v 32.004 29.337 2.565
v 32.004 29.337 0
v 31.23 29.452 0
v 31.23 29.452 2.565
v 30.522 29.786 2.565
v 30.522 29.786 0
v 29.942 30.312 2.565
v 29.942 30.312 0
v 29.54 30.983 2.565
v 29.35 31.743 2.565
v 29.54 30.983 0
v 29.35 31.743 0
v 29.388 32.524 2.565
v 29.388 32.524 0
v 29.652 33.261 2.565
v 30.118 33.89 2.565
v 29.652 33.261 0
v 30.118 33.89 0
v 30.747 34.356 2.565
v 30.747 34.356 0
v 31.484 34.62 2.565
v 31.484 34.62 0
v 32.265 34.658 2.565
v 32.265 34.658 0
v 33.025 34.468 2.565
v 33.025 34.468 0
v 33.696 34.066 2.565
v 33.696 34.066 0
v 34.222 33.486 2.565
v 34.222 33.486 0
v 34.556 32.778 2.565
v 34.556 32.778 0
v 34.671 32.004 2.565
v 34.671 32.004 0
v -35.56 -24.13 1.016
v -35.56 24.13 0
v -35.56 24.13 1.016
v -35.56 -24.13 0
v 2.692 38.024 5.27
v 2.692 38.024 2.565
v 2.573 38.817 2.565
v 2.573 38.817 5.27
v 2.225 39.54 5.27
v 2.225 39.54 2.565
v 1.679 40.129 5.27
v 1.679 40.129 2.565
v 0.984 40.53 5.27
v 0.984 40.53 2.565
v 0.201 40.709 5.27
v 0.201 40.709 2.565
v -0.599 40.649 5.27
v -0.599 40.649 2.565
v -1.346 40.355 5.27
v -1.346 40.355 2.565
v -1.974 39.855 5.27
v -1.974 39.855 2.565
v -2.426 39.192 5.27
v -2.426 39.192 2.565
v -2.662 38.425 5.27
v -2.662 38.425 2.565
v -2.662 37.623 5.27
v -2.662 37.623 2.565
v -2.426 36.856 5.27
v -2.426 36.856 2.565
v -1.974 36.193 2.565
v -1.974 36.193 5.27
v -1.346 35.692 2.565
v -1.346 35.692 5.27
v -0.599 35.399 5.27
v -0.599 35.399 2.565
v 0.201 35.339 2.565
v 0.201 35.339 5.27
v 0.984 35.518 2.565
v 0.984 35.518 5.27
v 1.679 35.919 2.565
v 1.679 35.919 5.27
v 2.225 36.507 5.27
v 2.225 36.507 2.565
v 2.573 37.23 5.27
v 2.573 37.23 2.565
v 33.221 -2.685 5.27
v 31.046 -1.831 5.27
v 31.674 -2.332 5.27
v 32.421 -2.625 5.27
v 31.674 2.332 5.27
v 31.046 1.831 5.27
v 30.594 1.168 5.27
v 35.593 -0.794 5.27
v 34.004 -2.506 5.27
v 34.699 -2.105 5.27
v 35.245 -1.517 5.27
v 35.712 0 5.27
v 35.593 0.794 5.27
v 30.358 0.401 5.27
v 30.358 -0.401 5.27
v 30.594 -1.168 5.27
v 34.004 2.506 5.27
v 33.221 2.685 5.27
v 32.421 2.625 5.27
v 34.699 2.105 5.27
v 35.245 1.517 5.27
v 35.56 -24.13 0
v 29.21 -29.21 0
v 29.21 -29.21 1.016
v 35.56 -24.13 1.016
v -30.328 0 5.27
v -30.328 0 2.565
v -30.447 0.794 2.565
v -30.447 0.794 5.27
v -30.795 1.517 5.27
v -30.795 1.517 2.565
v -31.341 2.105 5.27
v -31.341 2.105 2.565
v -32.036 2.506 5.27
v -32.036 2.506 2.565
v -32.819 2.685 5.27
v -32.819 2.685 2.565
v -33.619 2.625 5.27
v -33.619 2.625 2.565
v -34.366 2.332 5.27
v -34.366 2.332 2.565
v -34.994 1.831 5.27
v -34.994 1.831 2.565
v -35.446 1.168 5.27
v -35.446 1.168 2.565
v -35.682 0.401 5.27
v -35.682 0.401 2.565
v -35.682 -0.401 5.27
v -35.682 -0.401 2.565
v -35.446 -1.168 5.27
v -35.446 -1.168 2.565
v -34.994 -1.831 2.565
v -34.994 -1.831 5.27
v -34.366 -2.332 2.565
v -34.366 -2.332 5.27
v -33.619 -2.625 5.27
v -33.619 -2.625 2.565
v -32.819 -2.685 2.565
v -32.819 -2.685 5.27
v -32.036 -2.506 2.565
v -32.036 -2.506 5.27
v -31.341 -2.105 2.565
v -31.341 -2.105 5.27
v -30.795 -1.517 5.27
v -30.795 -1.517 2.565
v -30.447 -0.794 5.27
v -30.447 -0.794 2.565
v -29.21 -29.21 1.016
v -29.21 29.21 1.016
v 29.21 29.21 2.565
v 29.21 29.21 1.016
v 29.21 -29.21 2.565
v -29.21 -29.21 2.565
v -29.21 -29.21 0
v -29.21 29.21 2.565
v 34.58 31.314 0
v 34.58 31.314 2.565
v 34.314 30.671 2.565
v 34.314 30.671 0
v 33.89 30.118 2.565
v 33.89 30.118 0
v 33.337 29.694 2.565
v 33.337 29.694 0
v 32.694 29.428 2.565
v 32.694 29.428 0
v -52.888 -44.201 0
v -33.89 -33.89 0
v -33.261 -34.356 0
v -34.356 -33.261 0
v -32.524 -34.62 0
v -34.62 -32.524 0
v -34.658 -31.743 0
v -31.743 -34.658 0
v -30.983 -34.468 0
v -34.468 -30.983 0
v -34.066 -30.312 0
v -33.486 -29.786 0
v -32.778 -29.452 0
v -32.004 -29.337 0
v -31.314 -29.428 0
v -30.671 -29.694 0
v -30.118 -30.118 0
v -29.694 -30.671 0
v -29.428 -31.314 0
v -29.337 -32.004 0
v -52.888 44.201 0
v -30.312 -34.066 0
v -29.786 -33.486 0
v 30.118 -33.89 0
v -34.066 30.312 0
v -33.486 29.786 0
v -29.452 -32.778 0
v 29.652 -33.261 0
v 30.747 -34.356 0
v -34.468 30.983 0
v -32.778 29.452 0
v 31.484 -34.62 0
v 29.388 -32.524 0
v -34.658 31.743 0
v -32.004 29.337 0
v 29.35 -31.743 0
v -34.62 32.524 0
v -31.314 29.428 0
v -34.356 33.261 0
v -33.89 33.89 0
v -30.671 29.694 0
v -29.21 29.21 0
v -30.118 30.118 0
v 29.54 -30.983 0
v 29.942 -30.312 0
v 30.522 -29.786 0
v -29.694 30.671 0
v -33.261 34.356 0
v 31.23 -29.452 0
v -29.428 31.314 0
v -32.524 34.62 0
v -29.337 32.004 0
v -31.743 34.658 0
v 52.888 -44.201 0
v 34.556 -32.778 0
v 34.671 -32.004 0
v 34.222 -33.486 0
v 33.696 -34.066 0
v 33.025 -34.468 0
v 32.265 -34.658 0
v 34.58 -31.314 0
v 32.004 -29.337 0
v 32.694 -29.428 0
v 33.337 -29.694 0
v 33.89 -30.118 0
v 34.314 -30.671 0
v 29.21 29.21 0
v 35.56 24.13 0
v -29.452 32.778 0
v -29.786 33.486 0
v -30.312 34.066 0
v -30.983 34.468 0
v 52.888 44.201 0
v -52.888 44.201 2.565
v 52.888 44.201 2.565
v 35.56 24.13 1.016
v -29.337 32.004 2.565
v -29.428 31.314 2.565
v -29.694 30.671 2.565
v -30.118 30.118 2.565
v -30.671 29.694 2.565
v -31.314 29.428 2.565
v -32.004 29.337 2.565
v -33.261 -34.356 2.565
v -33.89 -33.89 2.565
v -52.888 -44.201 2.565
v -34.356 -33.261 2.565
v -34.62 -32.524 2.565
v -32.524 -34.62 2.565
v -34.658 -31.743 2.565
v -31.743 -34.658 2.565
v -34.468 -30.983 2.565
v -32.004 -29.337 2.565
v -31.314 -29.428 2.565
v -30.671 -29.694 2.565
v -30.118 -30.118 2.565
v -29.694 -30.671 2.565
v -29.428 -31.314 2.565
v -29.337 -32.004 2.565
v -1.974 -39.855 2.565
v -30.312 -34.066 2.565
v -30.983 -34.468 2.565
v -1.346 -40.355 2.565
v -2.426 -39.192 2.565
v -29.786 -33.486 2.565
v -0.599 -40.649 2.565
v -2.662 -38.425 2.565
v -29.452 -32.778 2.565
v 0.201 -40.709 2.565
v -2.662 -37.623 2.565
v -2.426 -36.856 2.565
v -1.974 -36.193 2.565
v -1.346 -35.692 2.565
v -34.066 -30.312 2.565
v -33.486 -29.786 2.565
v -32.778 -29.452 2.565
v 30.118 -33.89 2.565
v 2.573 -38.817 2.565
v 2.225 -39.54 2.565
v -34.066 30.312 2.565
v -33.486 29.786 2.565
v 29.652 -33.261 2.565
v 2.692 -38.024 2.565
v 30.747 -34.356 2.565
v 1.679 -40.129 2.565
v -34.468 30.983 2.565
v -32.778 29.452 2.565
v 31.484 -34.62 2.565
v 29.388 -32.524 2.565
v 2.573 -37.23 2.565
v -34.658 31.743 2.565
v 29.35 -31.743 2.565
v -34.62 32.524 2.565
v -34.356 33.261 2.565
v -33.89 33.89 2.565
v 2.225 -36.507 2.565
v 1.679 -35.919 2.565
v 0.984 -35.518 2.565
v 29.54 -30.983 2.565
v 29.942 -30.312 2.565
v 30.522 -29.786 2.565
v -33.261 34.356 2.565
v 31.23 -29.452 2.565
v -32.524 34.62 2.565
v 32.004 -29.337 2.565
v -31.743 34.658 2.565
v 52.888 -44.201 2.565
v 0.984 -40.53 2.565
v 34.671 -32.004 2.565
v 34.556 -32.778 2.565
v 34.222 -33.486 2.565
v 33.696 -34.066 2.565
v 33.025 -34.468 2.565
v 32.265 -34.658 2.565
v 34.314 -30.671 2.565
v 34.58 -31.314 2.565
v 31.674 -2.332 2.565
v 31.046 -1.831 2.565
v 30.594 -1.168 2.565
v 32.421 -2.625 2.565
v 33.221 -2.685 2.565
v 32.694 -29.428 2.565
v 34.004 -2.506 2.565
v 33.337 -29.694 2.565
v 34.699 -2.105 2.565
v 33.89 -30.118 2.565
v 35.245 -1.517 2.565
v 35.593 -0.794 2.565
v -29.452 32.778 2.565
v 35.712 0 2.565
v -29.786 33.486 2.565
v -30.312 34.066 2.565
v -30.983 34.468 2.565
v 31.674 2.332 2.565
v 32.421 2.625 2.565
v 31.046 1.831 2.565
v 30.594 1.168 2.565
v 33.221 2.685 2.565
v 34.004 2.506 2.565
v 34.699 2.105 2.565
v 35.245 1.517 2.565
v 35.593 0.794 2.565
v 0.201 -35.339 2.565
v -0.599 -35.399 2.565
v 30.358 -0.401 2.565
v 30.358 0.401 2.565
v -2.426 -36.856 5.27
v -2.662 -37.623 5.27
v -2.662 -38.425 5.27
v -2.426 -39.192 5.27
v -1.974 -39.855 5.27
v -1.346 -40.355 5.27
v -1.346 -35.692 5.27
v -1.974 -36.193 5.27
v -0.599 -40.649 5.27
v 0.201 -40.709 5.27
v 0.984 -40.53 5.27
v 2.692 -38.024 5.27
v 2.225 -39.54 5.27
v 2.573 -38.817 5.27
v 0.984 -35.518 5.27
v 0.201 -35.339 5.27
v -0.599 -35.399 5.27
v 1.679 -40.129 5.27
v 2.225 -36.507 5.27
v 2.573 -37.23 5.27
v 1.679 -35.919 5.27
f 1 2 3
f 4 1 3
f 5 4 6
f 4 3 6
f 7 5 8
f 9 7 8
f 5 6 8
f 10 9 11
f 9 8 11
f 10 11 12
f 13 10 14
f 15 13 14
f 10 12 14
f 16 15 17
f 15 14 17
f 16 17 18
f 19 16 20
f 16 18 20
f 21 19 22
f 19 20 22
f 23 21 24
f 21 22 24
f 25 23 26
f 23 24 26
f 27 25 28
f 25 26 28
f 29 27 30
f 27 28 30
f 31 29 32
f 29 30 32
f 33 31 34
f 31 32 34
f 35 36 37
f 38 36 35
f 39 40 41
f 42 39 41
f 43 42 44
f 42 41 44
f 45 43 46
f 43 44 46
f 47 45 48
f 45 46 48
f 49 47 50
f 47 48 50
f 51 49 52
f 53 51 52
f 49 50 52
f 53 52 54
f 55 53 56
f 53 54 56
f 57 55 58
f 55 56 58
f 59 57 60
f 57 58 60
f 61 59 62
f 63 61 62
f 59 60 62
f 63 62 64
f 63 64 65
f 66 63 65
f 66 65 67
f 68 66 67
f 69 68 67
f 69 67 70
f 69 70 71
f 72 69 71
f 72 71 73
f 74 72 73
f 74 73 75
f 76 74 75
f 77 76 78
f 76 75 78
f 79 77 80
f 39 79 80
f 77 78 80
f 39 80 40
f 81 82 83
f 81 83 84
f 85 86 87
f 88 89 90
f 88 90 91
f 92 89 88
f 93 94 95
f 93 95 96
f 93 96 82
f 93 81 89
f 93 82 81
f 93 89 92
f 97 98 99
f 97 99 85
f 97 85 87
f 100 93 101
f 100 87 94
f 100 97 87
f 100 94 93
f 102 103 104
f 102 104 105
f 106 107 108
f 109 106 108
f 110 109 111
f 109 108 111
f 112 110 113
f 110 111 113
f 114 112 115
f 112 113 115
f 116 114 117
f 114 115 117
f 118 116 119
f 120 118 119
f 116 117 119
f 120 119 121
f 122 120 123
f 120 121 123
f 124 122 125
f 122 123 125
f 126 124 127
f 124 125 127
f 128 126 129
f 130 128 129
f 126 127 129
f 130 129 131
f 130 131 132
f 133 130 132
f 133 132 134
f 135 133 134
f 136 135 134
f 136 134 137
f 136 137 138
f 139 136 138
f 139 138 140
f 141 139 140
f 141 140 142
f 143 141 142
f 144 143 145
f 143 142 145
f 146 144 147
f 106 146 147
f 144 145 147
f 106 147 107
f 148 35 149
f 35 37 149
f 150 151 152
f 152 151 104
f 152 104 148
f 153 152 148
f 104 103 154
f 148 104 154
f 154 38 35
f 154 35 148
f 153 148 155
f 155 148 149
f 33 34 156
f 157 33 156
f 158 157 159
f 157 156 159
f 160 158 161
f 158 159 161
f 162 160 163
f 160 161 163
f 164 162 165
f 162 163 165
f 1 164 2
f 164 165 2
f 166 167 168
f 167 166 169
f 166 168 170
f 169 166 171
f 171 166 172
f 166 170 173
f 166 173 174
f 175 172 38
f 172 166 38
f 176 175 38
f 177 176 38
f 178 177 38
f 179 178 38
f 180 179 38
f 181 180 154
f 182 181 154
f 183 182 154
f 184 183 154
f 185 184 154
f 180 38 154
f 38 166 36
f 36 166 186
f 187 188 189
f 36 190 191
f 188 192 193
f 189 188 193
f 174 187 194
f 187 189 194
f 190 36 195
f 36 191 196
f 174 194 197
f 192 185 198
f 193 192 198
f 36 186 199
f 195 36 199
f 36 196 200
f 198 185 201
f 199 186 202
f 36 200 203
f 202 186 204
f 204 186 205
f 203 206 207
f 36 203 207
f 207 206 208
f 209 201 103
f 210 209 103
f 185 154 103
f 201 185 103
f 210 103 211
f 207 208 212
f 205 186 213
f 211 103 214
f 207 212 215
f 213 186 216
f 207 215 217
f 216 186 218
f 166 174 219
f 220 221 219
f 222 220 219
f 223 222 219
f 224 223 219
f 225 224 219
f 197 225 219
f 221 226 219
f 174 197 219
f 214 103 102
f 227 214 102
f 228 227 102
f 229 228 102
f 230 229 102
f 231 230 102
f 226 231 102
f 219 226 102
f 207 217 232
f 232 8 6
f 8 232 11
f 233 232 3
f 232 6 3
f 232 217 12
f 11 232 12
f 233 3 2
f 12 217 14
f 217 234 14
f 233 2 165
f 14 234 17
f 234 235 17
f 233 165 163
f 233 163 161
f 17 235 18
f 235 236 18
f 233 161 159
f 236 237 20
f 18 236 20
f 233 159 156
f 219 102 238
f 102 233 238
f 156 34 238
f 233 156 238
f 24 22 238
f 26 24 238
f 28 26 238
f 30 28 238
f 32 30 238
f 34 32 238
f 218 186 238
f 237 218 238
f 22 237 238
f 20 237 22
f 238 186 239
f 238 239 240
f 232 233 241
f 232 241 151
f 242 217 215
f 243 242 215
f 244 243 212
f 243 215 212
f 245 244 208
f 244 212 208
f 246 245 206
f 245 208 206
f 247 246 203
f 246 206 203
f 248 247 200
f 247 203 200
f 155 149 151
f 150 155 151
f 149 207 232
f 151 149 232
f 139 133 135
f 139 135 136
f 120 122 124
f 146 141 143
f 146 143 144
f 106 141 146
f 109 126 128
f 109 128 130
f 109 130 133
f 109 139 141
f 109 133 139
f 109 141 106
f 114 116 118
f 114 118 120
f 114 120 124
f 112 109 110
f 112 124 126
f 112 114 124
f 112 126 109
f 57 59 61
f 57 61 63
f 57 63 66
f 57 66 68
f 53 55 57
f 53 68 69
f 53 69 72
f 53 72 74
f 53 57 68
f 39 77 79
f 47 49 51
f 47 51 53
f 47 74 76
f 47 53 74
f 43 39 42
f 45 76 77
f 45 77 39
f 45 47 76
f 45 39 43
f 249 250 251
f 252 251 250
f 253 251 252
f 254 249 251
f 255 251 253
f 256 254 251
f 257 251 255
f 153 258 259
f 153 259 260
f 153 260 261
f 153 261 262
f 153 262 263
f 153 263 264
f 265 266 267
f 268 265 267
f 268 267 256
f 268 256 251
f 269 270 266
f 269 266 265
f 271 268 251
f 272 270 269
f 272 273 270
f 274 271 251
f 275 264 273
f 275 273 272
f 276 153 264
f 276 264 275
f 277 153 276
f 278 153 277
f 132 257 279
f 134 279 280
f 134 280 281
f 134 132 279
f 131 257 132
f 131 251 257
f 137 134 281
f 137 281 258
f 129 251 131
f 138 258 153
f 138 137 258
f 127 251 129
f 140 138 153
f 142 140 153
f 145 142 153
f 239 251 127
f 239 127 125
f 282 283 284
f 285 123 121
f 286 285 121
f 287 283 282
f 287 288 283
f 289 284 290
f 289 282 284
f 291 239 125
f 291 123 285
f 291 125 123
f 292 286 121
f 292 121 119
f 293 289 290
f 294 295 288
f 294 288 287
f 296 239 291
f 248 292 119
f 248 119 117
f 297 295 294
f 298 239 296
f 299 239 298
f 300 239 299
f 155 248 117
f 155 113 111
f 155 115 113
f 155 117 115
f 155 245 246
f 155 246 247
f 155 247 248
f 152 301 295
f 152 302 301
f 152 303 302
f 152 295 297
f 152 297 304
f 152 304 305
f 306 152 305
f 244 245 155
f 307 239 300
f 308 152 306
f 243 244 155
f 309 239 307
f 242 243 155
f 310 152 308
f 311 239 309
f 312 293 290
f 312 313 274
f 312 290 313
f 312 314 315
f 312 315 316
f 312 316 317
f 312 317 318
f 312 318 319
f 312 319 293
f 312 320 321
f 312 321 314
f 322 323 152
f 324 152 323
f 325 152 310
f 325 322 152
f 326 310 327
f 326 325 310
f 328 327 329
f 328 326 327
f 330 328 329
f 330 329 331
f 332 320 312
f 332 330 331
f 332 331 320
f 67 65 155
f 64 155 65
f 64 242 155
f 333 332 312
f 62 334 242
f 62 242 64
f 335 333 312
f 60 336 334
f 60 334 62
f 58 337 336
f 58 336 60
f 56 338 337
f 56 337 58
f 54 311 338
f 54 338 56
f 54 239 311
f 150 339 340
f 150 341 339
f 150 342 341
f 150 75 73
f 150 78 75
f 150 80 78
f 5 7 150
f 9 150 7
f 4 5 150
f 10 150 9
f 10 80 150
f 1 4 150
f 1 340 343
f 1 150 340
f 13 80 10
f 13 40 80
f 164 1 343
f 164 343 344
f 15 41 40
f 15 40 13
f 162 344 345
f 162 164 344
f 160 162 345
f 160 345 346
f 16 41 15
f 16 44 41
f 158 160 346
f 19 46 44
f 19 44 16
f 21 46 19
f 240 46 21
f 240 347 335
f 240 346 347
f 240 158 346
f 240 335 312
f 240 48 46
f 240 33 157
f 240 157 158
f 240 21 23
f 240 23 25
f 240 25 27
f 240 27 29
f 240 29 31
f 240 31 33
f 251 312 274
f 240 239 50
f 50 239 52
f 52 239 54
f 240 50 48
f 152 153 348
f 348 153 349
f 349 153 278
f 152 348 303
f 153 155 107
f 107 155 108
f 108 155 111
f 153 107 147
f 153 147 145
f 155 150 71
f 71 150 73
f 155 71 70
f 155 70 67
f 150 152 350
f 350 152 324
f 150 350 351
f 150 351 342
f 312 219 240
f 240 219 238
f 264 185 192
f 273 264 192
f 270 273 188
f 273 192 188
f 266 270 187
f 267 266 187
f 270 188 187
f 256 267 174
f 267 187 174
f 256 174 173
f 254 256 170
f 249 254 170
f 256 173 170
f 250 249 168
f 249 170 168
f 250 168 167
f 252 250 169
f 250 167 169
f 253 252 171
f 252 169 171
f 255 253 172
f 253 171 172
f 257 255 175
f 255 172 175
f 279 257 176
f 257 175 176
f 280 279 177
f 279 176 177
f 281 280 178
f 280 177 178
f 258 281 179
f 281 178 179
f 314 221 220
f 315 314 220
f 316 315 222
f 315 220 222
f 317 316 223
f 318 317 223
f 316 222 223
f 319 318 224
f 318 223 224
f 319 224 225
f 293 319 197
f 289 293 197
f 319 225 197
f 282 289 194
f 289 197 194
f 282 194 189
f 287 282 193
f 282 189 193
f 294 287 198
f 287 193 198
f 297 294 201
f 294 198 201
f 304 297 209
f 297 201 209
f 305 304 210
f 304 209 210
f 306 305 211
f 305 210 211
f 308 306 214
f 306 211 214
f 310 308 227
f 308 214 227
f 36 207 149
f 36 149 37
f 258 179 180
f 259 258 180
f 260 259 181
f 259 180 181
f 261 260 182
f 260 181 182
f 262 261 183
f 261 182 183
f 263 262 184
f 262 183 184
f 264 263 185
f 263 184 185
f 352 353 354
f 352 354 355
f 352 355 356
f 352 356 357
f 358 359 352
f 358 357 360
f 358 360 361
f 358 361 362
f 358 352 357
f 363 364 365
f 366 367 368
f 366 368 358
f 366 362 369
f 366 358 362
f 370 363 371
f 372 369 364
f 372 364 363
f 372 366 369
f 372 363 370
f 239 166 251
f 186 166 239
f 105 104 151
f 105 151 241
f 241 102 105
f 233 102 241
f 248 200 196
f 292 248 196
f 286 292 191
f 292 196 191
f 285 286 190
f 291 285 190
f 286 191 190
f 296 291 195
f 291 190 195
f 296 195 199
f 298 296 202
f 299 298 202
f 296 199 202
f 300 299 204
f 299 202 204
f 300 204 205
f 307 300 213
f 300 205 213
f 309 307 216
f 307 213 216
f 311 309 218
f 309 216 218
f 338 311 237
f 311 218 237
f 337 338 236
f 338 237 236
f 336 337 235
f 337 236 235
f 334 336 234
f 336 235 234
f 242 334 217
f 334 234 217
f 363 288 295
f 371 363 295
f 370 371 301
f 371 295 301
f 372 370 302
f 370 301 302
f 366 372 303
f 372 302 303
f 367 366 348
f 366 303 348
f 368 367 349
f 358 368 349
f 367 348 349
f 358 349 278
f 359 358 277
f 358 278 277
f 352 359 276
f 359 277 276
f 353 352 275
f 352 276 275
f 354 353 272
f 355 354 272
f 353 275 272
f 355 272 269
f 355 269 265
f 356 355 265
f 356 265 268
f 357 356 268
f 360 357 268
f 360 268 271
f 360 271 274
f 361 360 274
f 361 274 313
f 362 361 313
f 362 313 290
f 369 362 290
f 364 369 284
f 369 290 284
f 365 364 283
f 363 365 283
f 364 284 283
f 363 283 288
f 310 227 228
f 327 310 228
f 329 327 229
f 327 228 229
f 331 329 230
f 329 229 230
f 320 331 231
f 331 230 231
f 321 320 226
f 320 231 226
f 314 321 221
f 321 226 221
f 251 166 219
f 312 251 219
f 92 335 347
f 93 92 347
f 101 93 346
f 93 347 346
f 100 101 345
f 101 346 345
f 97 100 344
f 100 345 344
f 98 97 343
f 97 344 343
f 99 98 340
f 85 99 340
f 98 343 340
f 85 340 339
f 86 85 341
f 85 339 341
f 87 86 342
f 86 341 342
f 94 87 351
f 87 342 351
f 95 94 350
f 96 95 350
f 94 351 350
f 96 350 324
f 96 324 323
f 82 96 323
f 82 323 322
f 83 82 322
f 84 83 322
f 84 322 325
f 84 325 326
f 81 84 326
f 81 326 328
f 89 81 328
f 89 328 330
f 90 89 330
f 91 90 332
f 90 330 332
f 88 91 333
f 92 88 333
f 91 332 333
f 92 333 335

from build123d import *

# Parameters (mm, degrees)
F0_W     = 105.7758629322
F0_H     = 88.4018465877
F0_R     = 2.6924
F1_DEPTH = 2.5654
F2_DEPTH = 1.016
F3_R     = 2.6924
F4_DEPTH = 2.7051


with BuildPart() as f1:
    # F0 (on Top) → F1 (new body)
    with BuildSketch(Plane.XY):
        Rectangle(F0_W, F0_H)
        with BuildLine():
            ThreePointArc((-32.004, -29.337), (-30.1181462146, -30.1181462146), (-29.337, -32.004))
            ThreePointArc((-29.337, -32.004), (-33.8898537854, -33.8898537854), (-32.004, -29.337))
        make_face(mode=Mode.SUBTRACT)
        with Locations((0, -38.0238)):
            Circle(F0_R, mode=Mode.SUBTRACT)
        with BuildLine():
            ThreePointArc((32.004, -29.337), (33.8898537854, -30.1181462146), (34.671, -32.004))
            ThreePointArc((34.671, -32.004), (30.1181462146, -33.8898537854), (32.004, -29.337))
        make_face(mode=Mode.SUBTRACT)
        with BuildLine():
            ThreePointArc((-32.004, 29.337), (-33.8898537854, 33.8898537854), (-29.337, 32.004))
            ThreePointArc((-29.337, 32.004), (-30.1181462146, 30.1181462146), (-32.004, 29.337))
        make_face(mode=Mode.SUBTRACT)
        with BuildLine():
            Line((35.56, -24.13), (29.21, -29.21))
            Line((29.21, -29.21), (-29.21, -29.21))
            Line((-29.21, -29.21), (-35.56, -24.13))
            Line((-35.56, -24.13), (-35.56, -0.8929825082))
            ThreePointArc((-35.56, -0.8929825082), (-35.7124, 0), (-35.56, 0.8929825082))
            Line((-35.56, 0.8929825082), (-35.56, 24.13))
            Line((-35.56, 24.13), (-29.21, 29.21))
            Line((-29.21, 29.21), (0, 29.21))
            Line((0, 29.21), (29.21, 29.21))
            Line((29.21, 29.21), (35.56, 24.13))
            Line((35.56, 24.13), (35.56, 0.8929825082))
            ThreePointArc((35.56, 0.8929825082), (35.6740265409, 0.4529468843), (35.7124, 0))
            ThreePointArc((35.7124, 0), (35.6740265409, -0.4529468843), (35.56, -0.8929825082))
            Line((35.56, -0.8929825082), (35.56, -24.13))
        make_face(mode=Mode.SUBTRACT)
        with BuildLine():
            ThreePointArc((2.6924, 38.0238), (1.9038142977, 36.1199857023), (0, 35.3314))
            ThreePointArc((0, 35.3314), (-1.9038142977, 39.9276142977), (2.6924, 38.0238))
        make_face(mode=Mode.SUBTRACT)
        with BuildLine():
            ThreePointArc((32.004, 29.337), (30.1181462146, 33.8898537854), (34.671, 32.004))
            ThreePointArc((34.671, 32.004), (33.8898537854, 30.1181462146), (32.004, 29.337))
        make_face(mode=Mode.SUBTRACT)
        with BuildLine():
            Line((-35.56, -24.13), (-29.21, -29.21))
            Line((-29.21, -29.21), (-29.21, 29.21))
            Line((-29.21, 29.21), (-35.56, 24.13))
            Line((-35.56, 24.13), (-35.56, 0.8929825082))
            ThreePointArc((-35.56, 0.8929825082), (-32.5670531157, 2.6540265409), (-30.3276, 0))
            ThreePointArc((-30.3276, 0), (-32.5670531157, -2.6540265409), (-35.56, -0.8929825082))
            Line((-35.56, -0.8929825082), (-35.56, -24.13))
        make_face()
        with BuildLine():
            Line((29.21, 29.21), (29.21, -29.21))
            Line((29.21, -29.21), (35.56, -24.13))
            Line((35.56, -24.13), (35.56, -0.8929825082))
            ThreePointArc((35.56, -0.8929825082), (30.3276, 0), (35.56, 0.8929825082))
            Line((35.56, 0.8929825082), (35.56, 24.13))
            Line((35.56, 24.13), (29.21, 29.21))
        make_face()
        with BuildLine():
            ThreePointArc((2.6924, 38.0238), (-1.9038142977, 39.9276142977), (0, 35.3314))
            ThreePointArc((0, 35.3314), (1.9038142977, 36.1199857023), (2.6924, 38.0238))
        make_face()
        with Locations((0, -38.0238)):
            Circle(F0_R)
        with BuildLine():
            Line((-35.56, 0.8929825082), (-35.56, -0.8929825082))
            ThreePointArc((-35.56, -0.8929825082), (-32.5670531157, -2.6540265409), (-30.3276, 0))
            ThreePointArc((-30.3276, 0), (-32.5670531157, 2.6540265409), (-35.56, 0.8929825082))
        make_face()
        with BuildLine():
            ThreePointArc((35.56, 0.8929825082), (30.3276, 0), (35.56, -0.8929825082))
            Line((35.56, -0.8929825082), (35.56, 0.8929825082))
        make_face()
        with BuildLine():
            Line((35.56, 0.8929825082), (35.56, -0.8929825082))
            ThreePointArc((35.56, -0.8929825082), (35.6740265409, -0.4529468843), (35.7124, 0))
            ThreePointArc((35.7124, 0), (35.6740265409, 0.4529468843), (35.56, 0.8929825082))
        make_face()
        with BuildLine():
            ThreePointArc((-35.56, 0.8929825082), (-35.7124, 0), (-35.56, -0.8929825082))
            Line((-35.56, -0.8929825082), (-35.56, 0.8929825082))
        make_face()
    extrude(amount=F1_DEPTH)

    # F0 (on Top) → F2 (cut)
    with BuildSketch(Plane.XY):
        with BuildLine():
            Line((29.21, 29.21), (29.21, -29.21))
            Line((29.21, -29.21), (35.56, -24.13))
            Line((35.56, -24.13), (35.56, -0.8929825082))
            ThreePointArc((35.56, -0.8929825082), (30.3276, 0), (35.56, 0.8929825082))
            Line((35.56, 0.8929825082), (35.56, 24.13))
            Line((35.56, 24.13), (29.21, 29.21))
        make_face()
        with BuildLine():
            ThreePointArc((35.56, 0.8929825082), (30.3276, 0), (35.56, -0.8929825082))
            Line((35.56, -0.8929825082), (35.56, 0.8929825082))
        make_face()
        with BuildLine():
            Line((-35.56, -24.13), (-29.21, -29.21))
            Line((-29.21, -29.21), (-29.21, 29.21))
            Line((-29.21, 29.21), (-35.56, 24.13))
            Line((-35.56, 24.13), (-35.56, 0.8929825082))
            ThreePointArc((-35.56, 0.8929825082), (-32.5670531157, 2.6540265409), (-30.3276, 0))
            ThreePointArc((-30.3276, 0), (-32.5670531157, -2.6540265409), (-35.56, -0.8929825082))
            Line((-35.56, -0.8929825082), (-35.56, -24.13))
        make_face()
        with BuildLine():
            Line((-35.56, 0.8929825082), (-35.56, -0.8929825082))
            ThreePointArc((-35.56, -0.8929825082), (-32.5670531157, -2.6540265409), (-30.3276, 0))
            ThreePointArc((-30.3276, 0), (-32.5670531157, 2.6540265409), (-35.56, 0.8929825082))
        make_face()
    extrude(amount=F2_DEPTH, mode=Mode.SUBTRACT)

    # F3 (on face) → F4 (join)
    with BuildSketch(Plane.XY.offset(2.5654)):
        with Locations((0, 38.0238)):
            Circle(F3_R)
        with Locations((0, -38.0238)):
            Circle(F3_R)
        with Locations((33.02, 0)):
            Circle(F3_R)
        with Locations((-33.02, 0)):
            Circle(F3_R)
    extrude(amount=F4_DEPTH)


solid = f1.part
